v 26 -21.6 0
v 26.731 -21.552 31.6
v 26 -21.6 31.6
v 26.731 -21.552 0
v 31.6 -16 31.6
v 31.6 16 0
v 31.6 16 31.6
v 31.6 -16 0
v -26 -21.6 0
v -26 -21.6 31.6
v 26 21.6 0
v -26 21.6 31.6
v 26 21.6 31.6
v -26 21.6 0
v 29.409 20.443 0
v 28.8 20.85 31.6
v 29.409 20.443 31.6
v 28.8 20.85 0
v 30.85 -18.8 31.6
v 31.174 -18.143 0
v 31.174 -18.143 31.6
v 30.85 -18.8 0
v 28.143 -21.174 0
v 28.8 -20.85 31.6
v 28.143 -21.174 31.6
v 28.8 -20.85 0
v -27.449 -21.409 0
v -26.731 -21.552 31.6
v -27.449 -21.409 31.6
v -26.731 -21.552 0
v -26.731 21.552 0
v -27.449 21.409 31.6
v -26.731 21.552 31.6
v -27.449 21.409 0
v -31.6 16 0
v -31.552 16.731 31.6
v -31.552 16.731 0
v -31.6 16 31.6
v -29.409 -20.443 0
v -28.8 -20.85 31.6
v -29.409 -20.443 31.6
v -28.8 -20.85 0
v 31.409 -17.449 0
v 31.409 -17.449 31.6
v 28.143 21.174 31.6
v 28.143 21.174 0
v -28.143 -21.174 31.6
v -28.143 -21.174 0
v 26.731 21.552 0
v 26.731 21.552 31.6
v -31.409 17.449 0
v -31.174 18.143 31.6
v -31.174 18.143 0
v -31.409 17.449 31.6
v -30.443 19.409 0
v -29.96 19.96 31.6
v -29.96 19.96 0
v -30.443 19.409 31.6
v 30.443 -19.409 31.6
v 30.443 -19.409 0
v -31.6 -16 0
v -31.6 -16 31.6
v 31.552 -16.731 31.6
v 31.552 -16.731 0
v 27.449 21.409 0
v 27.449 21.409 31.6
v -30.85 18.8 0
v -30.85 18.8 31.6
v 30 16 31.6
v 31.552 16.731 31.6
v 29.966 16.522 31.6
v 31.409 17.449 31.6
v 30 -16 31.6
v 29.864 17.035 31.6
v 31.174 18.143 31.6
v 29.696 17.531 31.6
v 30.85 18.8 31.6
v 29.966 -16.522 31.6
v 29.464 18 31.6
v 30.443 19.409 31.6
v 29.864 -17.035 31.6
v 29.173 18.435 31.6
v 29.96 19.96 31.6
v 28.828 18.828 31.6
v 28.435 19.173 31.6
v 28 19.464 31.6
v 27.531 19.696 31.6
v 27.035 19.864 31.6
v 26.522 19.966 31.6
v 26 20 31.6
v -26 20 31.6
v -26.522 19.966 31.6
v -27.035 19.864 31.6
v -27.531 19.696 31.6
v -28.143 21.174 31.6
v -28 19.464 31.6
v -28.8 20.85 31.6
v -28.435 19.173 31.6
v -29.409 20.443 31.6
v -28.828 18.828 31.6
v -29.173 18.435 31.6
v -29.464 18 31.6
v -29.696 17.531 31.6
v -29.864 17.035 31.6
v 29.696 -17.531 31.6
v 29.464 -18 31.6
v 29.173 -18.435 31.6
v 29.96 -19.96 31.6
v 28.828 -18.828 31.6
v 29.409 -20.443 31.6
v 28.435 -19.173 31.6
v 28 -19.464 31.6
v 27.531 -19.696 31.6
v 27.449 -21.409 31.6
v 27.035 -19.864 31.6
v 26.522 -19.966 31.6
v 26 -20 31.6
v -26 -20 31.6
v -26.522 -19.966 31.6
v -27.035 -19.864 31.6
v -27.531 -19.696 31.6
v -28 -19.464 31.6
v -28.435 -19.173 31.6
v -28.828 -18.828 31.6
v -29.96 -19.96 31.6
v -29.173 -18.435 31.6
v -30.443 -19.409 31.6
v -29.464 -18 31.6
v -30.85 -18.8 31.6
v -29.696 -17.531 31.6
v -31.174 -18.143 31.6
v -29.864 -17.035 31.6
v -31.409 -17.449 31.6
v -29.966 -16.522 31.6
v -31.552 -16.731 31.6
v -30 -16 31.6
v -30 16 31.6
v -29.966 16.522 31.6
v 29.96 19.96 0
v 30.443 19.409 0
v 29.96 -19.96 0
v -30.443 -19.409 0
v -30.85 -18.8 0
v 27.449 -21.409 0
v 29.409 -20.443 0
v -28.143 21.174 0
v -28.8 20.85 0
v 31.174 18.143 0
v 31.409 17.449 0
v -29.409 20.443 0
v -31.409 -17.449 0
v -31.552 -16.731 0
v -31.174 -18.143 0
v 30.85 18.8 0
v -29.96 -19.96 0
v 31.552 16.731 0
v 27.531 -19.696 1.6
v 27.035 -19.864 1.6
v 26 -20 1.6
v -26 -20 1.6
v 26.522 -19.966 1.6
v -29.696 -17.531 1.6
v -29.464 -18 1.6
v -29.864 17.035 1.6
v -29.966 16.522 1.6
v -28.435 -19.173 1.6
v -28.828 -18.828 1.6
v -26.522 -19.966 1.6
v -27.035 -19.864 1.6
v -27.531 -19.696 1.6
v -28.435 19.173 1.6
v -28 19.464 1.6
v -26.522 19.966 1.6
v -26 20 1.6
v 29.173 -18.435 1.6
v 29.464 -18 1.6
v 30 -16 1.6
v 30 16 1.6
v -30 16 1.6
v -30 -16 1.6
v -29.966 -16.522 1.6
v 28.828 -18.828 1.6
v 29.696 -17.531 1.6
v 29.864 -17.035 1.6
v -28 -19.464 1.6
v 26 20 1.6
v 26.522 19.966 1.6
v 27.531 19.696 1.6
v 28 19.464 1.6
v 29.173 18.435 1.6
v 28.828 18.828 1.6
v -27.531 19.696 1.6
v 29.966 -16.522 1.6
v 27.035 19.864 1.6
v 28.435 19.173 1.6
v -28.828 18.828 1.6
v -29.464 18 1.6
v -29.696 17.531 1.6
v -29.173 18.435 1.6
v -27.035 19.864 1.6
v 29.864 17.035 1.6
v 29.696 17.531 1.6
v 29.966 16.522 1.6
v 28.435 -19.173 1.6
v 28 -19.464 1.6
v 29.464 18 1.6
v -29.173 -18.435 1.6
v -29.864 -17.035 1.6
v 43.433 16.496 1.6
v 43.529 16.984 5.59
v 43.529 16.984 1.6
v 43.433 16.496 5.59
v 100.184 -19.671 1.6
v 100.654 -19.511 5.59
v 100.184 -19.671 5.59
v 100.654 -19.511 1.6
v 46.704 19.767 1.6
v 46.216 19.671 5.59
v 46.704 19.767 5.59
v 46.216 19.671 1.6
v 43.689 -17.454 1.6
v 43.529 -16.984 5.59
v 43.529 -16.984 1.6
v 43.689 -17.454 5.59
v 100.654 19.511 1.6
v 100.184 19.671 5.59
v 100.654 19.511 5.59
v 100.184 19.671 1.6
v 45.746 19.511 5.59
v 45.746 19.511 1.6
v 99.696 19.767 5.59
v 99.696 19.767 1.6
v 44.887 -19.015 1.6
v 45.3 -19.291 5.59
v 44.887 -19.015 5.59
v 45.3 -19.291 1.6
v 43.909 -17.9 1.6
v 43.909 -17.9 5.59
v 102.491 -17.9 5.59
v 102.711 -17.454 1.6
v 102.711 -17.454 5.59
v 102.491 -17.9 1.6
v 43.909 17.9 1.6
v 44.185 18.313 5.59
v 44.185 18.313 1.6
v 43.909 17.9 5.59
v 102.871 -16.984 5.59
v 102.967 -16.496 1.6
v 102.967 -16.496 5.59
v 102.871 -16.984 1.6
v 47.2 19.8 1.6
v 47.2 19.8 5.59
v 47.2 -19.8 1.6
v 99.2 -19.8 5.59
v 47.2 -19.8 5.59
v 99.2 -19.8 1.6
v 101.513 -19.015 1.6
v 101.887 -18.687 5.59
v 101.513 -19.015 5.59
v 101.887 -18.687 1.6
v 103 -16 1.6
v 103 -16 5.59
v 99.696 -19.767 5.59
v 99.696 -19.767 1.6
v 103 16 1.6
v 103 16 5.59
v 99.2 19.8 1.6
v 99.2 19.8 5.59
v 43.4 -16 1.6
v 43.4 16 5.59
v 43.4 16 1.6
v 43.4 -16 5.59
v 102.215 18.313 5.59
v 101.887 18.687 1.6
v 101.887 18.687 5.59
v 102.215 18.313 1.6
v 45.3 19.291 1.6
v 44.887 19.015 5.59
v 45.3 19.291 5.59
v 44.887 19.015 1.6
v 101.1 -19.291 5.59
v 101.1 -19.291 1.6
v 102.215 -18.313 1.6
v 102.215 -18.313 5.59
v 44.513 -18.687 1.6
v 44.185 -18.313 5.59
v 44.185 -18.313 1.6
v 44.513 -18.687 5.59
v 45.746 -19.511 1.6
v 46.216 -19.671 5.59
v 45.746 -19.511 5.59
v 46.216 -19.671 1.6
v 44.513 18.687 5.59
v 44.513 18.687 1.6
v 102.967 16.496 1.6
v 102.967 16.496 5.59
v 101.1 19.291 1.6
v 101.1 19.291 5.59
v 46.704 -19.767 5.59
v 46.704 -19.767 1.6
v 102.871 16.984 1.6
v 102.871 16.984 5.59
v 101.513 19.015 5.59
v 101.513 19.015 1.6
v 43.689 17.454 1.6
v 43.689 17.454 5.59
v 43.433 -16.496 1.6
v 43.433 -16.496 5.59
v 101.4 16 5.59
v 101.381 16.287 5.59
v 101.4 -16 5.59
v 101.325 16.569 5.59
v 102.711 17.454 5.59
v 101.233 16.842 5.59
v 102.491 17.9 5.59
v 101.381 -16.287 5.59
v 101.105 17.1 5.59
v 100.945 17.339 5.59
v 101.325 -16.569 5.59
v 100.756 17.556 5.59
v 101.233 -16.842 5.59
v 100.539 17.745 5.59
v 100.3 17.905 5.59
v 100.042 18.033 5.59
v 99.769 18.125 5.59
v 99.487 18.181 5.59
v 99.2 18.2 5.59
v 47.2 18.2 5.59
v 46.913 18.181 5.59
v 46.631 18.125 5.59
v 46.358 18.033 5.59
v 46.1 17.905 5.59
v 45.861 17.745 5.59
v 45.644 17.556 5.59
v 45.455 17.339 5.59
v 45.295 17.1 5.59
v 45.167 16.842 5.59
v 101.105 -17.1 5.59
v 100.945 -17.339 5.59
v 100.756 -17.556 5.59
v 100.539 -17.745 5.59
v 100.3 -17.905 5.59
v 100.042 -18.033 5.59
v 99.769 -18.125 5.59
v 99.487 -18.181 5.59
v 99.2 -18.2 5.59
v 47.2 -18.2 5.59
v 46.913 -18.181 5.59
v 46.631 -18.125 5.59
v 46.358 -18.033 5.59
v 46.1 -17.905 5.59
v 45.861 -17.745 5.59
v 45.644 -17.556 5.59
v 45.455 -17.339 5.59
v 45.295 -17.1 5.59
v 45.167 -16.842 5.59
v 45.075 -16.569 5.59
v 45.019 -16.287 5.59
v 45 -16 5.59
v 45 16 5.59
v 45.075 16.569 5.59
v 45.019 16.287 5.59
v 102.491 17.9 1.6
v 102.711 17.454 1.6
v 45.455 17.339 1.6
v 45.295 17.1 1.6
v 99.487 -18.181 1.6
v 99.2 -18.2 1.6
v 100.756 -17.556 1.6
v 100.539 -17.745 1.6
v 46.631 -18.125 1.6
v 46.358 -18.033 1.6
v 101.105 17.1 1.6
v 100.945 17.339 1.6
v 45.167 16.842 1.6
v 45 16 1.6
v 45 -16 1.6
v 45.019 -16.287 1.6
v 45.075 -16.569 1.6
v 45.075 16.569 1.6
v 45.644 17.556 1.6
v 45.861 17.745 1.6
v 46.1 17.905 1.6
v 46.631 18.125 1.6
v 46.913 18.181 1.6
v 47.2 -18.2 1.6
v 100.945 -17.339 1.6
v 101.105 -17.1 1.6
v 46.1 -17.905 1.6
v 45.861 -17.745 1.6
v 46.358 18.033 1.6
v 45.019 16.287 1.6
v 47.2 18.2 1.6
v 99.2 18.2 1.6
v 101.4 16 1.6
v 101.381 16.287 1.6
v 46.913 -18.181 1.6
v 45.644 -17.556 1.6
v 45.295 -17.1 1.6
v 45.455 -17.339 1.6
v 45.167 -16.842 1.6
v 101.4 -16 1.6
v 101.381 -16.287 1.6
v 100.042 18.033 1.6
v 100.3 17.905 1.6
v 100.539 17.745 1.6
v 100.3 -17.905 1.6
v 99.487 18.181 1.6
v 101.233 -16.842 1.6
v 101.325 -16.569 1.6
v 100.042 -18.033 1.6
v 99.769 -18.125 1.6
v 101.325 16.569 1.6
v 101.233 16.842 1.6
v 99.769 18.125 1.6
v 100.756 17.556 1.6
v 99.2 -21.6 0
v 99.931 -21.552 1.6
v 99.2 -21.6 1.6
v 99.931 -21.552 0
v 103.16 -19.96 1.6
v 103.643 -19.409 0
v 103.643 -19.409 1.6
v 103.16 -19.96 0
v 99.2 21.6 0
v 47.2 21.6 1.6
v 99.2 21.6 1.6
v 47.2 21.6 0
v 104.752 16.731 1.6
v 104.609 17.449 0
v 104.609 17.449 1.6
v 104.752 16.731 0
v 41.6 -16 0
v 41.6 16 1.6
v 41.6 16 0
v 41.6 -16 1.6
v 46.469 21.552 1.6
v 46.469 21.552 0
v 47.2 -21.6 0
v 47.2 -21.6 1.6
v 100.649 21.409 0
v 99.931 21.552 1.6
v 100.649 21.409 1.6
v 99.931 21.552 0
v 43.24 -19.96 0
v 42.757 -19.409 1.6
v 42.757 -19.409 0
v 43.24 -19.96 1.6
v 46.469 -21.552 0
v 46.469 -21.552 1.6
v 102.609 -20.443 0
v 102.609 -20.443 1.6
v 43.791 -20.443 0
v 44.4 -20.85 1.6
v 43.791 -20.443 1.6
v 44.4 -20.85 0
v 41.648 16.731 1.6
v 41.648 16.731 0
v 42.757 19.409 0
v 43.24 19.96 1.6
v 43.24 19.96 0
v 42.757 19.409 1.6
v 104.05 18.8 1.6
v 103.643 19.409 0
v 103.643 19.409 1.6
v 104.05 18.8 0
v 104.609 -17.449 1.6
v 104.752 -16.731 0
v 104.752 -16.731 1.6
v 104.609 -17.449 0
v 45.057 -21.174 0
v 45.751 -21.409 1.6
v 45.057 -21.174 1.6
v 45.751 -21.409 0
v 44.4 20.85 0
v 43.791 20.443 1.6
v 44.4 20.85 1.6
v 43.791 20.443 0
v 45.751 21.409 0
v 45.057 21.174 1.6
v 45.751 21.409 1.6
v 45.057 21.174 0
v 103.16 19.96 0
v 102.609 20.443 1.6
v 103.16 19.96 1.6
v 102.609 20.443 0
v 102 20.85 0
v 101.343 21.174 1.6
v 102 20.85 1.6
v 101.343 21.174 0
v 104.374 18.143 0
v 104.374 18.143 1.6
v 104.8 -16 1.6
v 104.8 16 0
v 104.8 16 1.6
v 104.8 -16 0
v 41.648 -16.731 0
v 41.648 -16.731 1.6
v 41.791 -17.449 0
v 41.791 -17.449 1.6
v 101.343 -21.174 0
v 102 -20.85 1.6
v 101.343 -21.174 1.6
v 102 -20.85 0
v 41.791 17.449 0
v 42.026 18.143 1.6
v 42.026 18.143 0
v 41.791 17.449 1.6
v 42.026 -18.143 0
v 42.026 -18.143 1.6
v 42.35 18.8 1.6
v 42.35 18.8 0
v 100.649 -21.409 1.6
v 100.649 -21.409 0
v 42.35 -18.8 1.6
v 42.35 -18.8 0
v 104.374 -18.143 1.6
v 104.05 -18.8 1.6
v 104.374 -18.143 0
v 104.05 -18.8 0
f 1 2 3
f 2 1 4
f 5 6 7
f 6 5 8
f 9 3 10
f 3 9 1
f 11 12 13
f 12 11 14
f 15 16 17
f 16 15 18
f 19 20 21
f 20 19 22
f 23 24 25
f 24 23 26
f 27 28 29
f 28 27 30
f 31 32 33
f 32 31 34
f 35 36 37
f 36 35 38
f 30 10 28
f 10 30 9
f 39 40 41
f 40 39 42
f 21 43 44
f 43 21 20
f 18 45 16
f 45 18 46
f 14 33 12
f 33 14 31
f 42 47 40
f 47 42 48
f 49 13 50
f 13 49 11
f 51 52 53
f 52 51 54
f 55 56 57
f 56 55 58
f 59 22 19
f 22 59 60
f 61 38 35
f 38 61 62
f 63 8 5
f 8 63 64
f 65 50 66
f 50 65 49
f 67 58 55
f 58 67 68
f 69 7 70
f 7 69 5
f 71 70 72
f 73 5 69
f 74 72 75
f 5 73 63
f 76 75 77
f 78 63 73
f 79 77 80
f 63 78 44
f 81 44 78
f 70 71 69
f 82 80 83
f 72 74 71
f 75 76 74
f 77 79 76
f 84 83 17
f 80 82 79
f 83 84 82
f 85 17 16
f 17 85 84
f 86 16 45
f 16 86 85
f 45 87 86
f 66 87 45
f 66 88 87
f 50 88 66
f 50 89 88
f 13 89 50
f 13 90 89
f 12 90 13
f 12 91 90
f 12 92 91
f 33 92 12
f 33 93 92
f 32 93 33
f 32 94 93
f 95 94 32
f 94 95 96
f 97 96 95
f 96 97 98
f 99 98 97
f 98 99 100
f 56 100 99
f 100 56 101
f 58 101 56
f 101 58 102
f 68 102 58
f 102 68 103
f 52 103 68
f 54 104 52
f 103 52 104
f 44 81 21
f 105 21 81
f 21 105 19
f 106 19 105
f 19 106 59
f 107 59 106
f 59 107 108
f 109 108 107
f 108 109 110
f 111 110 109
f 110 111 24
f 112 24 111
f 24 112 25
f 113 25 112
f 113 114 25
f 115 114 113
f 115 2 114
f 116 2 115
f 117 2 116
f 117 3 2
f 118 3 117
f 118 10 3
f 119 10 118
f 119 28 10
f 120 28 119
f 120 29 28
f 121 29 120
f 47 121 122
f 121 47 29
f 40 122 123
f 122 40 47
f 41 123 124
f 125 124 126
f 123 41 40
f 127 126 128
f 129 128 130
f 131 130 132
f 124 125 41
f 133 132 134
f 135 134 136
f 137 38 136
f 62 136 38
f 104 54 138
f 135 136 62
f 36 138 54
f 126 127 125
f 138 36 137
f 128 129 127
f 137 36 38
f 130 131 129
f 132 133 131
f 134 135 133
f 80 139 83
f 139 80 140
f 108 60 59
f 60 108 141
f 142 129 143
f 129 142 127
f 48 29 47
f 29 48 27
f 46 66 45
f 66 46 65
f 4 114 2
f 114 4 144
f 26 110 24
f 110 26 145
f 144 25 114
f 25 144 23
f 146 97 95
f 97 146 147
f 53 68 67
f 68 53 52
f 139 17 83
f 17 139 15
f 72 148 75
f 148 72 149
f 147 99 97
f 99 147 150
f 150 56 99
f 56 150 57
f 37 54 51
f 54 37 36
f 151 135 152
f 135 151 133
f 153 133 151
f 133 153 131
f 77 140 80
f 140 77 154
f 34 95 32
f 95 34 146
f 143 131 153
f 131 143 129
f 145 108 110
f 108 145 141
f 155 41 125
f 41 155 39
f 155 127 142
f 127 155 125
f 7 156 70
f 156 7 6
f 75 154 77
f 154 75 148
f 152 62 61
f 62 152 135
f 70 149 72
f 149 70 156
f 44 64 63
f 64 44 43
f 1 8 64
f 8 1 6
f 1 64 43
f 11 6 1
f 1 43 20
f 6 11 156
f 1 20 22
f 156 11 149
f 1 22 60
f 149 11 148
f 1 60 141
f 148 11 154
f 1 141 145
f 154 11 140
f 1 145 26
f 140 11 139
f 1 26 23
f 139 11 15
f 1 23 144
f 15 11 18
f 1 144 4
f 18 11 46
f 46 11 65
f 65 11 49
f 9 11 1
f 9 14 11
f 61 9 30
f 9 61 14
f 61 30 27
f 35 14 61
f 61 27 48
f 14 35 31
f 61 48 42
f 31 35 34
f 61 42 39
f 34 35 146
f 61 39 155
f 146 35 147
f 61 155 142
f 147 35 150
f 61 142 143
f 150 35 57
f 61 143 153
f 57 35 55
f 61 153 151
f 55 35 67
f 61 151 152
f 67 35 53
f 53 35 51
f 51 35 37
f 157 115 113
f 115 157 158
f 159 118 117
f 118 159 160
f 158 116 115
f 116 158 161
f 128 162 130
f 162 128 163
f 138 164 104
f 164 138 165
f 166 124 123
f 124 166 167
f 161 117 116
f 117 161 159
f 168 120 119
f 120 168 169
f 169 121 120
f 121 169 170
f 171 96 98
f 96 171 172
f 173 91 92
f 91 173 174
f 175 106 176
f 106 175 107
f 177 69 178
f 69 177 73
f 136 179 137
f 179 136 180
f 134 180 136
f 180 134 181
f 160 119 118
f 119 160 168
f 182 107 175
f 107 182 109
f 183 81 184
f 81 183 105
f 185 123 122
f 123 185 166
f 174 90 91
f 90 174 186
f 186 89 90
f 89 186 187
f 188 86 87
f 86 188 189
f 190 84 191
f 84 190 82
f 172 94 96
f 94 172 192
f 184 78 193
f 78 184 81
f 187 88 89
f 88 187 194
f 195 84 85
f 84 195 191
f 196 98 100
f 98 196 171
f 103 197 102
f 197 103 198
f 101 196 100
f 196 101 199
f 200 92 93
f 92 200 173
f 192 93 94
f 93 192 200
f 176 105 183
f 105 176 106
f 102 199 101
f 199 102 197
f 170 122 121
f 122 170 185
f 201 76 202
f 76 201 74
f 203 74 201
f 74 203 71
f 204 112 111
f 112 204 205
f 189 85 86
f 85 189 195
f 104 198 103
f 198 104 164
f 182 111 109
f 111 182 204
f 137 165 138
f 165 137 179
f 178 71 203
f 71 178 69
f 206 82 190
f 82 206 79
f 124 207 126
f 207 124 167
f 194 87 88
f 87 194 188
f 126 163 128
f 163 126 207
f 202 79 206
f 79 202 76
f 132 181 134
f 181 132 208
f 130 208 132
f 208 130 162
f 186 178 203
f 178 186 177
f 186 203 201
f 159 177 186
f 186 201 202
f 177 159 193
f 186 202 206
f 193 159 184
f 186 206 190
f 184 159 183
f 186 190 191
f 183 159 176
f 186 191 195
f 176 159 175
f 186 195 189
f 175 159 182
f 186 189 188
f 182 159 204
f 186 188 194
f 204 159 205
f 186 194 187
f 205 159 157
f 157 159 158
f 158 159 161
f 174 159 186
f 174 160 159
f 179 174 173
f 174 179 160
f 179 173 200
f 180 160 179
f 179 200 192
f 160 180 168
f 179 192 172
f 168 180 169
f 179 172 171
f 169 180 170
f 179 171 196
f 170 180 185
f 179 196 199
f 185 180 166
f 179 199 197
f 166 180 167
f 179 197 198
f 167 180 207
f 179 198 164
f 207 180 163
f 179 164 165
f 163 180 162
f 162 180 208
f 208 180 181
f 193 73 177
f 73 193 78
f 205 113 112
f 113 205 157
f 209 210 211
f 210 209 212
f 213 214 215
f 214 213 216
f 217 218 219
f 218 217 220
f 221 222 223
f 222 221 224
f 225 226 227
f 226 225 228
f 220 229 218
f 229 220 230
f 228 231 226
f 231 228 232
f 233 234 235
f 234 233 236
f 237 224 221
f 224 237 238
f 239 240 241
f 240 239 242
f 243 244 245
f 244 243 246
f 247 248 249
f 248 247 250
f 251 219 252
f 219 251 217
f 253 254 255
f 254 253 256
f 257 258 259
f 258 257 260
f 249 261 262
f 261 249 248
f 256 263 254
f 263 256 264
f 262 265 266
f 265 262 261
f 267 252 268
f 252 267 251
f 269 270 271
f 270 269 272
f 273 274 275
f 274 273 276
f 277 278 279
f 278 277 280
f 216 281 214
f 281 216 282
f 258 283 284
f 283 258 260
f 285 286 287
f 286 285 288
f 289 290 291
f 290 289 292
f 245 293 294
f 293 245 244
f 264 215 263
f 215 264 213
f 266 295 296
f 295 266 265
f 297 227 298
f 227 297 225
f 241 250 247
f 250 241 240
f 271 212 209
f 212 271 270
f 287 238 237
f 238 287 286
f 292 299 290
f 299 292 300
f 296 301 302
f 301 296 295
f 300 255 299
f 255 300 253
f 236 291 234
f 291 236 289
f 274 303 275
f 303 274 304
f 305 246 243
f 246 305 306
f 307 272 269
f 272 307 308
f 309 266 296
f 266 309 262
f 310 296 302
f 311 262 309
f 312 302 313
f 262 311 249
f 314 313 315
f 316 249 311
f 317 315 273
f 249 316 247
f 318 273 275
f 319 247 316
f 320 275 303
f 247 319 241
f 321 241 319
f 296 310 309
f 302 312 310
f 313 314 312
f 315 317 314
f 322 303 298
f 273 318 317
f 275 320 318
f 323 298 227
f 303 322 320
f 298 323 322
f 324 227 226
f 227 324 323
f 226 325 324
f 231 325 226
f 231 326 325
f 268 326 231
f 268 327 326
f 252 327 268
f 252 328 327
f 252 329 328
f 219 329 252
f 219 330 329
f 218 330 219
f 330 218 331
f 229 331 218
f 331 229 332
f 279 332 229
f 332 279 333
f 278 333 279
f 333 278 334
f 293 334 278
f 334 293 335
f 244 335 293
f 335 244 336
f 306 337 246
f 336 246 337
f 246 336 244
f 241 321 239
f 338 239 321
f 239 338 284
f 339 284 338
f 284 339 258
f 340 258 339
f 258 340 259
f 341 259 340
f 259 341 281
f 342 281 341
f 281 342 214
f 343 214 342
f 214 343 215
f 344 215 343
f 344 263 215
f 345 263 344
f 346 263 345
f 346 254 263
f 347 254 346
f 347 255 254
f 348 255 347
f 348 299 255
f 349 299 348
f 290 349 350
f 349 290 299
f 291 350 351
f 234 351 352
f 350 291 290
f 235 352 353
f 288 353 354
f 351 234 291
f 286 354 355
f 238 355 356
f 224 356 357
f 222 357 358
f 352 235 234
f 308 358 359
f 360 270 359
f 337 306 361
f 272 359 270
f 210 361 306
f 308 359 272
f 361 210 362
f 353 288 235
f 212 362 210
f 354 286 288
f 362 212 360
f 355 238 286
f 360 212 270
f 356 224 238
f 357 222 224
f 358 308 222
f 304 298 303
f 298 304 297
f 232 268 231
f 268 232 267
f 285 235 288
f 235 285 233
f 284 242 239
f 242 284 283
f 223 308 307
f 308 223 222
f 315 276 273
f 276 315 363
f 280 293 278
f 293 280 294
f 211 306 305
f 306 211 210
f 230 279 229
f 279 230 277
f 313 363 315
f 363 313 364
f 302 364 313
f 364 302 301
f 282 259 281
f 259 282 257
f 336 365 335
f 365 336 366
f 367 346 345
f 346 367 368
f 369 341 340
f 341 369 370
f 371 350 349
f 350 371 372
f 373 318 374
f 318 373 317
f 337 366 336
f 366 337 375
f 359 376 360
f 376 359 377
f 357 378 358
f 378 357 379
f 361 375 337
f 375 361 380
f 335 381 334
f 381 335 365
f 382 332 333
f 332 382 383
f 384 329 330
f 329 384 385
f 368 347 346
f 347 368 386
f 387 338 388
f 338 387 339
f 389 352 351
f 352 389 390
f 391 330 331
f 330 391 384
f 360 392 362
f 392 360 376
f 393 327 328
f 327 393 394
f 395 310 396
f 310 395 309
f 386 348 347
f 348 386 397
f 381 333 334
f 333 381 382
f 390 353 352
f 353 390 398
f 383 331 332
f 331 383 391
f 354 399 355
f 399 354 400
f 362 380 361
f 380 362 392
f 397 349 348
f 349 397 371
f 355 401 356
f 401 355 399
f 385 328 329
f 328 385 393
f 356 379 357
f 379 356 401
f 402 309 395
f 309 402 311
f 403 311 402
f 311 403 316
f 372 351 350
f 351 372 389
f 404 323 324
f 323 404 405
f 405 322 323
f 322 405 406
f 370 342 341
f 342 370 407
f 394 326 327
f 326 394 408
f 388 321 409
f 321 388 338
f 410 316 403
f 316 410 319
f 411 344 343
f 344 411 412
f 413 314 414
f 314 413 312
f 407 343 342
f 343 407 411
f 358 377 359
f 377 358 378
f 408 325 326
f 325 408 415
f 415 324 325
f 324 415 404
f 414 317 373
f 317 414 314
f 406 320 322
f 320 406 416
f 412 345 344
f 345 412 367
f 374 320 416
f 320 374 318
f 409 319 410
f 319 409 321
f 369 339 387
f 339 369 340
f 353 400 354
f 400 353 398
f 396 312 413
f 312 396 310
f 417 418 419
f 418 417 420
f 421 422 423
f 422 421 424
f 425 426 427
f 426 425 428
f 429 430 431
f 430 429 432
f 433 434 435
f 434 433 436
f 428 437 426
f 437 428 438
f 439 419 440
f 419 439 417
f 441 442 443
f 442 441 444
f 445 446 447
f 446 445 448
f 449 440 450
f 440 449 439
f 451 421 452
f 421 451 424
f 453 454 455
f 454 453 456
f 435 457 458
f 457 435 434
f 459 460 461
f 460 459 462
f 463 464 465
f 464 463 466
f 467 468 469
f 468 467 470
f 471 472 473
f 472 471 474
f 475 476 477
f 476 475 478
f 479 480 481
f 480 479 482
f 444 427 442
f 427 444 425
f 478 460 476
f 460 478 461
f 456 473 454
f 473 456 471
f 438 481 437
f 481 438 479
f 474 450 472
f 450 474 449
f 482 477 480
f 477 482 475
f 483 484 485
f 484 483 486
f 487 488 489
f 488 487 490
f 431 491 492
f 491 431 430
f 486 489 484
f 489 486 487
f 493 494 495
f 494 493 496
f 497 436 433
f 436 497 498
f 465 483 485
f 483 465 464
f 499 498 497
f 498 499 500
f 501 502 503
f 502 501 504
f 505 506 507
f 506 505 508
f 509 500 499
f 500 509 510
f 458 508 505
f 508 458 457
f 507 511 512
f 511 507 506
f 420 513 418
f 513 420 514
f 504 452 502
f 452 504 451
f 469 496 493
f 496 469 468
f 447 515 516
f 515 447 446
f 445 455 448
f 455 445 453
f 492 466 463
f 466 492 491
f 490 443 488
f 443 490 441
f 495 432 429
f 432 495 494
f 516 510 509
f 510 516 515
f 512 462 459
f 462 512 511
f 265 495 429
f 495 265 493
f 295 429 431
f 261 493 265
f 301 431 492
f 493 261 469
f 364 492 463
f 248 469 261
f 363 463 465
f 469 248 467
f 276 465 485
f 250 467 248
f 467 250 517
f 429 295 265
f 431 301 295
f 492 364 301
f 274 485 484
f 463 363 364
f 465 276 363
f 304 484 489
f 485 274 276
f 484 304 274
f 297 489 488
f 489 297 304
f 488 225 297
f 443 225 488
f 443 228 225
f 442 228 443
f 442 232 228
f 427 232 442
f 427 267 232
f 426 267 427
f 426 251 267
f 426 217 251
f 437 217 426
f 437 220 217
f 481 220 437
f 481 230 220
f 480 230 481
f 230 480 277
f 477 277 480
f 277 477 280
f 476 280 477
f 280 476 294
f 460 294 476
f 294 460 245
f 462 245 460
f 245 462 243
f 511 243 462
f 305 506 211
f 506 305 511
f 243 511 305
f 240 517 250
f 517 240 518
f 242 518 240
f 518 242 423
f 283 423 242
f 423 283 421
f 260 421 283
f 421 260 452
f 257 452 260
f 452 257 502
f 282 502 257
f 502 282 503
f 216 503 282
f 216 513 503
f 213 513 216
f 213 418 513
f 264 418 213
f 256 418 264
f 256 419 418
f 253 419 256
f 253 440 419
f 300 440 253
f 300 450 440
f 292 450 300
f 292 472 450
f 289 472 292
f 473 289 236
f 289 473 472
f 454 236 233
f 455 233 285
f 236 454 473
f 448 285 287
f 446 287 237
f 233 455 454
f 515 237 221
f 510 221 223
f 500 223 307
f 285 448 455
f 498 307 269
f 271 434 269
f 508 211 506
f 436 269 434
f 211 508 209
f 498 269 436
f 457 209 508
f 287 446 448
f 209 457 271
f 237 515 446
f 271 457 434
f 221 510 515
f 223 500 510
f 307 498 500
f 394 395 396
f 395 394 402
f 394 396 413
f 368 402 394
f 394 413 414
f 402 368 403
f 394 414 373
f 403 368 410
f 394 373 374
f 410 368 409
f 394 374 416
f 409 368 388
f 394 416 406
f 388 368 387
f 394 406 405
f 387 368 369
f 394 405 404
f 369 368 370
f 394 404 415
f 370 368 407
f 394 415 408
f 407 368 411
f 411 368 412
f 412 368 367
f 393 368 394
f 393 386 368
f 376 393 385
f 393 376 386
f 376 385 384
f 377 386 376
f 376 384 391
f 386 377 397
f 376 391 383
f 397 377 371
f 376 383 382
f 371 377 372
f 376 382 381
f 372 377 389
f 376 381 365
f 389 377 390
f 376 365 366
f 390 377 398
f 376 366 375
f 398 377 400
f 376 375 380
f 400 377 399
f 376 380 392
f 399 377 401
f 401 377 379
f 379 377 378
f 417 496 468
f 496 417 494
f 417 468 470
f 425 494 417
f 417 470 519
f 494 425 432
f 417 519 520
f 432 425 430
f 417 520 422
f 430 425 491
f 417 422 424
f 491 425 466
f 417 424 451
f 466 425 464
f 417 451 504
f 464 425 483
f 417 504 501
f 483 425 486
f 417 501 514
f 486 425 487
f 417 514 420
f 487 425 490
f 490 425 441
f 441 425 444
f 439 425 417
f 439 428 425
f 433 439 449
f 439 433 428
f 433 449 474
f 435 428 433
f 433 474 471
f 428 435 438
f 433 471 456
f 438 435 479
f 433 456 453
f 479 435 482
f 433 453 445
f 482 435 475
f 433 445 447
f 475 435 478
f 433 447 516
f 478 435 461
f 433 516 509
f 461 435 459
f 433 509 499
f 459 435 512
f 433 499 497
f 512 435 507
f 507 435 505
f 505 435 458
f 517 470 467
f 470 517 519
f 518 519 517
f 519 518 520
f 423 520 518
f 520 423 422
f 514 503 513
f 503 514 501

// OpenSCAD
// Box with lid — Primitive Generator example (Neotko fork)
// Prints as two pieces side by side: the box and its lid.

/* [Size] */
// Inside width
width = 60; // [10:200]
// Inside depth
depth = 40; // [10:200]
// Inside height
height = 30; // [5:150]

/* [Walls] */
// Wall thickness
wall = 1.6; // [0.8:0.2:5]
// Corner radius
corner = 4; // [0:20]
// Gap between lid and box, for the fit
fit = 0.2; // [0:0.05:0.6]
// Lid lip height
lip = 4; // [2:15]

/* [Hidden] */
$fn = 48;

module rounded(w, d, h, r) {
    r2 = max(0.01, min(r, w / 2 - 0.01, d / 2 - 0.01));
    linear_extrude(h)
        offset(r = r2) square([w - 2 * r2, d - 2 * r2], center = true);
}

module box() {
    difference() {
        rounded(width + 2 * wall, depth + 2 * wall, height + wall, corner + wall);
        translate([0, 0, wall]) rounded(width, depth, height + 1, corner);
    }
}

module lid() {
    rounded(width + 2 * wall, depth + 2 * wall, wall, corner + wall);
    translate([0, 0, wall - 0.01])
    difference() {
        rounded(width - 2 * fit, depth - 2 * fit, lip, corner - fit);
        translate([0, 0, -1]) rounded(width - 2 * fit - 2 * wall, depth - 2 * fit - 2 * wall, lip + 2, corner - fit - wall);
    }
}

box();
translate([width + 2 * wall + 10, 0, 0]) lid();
